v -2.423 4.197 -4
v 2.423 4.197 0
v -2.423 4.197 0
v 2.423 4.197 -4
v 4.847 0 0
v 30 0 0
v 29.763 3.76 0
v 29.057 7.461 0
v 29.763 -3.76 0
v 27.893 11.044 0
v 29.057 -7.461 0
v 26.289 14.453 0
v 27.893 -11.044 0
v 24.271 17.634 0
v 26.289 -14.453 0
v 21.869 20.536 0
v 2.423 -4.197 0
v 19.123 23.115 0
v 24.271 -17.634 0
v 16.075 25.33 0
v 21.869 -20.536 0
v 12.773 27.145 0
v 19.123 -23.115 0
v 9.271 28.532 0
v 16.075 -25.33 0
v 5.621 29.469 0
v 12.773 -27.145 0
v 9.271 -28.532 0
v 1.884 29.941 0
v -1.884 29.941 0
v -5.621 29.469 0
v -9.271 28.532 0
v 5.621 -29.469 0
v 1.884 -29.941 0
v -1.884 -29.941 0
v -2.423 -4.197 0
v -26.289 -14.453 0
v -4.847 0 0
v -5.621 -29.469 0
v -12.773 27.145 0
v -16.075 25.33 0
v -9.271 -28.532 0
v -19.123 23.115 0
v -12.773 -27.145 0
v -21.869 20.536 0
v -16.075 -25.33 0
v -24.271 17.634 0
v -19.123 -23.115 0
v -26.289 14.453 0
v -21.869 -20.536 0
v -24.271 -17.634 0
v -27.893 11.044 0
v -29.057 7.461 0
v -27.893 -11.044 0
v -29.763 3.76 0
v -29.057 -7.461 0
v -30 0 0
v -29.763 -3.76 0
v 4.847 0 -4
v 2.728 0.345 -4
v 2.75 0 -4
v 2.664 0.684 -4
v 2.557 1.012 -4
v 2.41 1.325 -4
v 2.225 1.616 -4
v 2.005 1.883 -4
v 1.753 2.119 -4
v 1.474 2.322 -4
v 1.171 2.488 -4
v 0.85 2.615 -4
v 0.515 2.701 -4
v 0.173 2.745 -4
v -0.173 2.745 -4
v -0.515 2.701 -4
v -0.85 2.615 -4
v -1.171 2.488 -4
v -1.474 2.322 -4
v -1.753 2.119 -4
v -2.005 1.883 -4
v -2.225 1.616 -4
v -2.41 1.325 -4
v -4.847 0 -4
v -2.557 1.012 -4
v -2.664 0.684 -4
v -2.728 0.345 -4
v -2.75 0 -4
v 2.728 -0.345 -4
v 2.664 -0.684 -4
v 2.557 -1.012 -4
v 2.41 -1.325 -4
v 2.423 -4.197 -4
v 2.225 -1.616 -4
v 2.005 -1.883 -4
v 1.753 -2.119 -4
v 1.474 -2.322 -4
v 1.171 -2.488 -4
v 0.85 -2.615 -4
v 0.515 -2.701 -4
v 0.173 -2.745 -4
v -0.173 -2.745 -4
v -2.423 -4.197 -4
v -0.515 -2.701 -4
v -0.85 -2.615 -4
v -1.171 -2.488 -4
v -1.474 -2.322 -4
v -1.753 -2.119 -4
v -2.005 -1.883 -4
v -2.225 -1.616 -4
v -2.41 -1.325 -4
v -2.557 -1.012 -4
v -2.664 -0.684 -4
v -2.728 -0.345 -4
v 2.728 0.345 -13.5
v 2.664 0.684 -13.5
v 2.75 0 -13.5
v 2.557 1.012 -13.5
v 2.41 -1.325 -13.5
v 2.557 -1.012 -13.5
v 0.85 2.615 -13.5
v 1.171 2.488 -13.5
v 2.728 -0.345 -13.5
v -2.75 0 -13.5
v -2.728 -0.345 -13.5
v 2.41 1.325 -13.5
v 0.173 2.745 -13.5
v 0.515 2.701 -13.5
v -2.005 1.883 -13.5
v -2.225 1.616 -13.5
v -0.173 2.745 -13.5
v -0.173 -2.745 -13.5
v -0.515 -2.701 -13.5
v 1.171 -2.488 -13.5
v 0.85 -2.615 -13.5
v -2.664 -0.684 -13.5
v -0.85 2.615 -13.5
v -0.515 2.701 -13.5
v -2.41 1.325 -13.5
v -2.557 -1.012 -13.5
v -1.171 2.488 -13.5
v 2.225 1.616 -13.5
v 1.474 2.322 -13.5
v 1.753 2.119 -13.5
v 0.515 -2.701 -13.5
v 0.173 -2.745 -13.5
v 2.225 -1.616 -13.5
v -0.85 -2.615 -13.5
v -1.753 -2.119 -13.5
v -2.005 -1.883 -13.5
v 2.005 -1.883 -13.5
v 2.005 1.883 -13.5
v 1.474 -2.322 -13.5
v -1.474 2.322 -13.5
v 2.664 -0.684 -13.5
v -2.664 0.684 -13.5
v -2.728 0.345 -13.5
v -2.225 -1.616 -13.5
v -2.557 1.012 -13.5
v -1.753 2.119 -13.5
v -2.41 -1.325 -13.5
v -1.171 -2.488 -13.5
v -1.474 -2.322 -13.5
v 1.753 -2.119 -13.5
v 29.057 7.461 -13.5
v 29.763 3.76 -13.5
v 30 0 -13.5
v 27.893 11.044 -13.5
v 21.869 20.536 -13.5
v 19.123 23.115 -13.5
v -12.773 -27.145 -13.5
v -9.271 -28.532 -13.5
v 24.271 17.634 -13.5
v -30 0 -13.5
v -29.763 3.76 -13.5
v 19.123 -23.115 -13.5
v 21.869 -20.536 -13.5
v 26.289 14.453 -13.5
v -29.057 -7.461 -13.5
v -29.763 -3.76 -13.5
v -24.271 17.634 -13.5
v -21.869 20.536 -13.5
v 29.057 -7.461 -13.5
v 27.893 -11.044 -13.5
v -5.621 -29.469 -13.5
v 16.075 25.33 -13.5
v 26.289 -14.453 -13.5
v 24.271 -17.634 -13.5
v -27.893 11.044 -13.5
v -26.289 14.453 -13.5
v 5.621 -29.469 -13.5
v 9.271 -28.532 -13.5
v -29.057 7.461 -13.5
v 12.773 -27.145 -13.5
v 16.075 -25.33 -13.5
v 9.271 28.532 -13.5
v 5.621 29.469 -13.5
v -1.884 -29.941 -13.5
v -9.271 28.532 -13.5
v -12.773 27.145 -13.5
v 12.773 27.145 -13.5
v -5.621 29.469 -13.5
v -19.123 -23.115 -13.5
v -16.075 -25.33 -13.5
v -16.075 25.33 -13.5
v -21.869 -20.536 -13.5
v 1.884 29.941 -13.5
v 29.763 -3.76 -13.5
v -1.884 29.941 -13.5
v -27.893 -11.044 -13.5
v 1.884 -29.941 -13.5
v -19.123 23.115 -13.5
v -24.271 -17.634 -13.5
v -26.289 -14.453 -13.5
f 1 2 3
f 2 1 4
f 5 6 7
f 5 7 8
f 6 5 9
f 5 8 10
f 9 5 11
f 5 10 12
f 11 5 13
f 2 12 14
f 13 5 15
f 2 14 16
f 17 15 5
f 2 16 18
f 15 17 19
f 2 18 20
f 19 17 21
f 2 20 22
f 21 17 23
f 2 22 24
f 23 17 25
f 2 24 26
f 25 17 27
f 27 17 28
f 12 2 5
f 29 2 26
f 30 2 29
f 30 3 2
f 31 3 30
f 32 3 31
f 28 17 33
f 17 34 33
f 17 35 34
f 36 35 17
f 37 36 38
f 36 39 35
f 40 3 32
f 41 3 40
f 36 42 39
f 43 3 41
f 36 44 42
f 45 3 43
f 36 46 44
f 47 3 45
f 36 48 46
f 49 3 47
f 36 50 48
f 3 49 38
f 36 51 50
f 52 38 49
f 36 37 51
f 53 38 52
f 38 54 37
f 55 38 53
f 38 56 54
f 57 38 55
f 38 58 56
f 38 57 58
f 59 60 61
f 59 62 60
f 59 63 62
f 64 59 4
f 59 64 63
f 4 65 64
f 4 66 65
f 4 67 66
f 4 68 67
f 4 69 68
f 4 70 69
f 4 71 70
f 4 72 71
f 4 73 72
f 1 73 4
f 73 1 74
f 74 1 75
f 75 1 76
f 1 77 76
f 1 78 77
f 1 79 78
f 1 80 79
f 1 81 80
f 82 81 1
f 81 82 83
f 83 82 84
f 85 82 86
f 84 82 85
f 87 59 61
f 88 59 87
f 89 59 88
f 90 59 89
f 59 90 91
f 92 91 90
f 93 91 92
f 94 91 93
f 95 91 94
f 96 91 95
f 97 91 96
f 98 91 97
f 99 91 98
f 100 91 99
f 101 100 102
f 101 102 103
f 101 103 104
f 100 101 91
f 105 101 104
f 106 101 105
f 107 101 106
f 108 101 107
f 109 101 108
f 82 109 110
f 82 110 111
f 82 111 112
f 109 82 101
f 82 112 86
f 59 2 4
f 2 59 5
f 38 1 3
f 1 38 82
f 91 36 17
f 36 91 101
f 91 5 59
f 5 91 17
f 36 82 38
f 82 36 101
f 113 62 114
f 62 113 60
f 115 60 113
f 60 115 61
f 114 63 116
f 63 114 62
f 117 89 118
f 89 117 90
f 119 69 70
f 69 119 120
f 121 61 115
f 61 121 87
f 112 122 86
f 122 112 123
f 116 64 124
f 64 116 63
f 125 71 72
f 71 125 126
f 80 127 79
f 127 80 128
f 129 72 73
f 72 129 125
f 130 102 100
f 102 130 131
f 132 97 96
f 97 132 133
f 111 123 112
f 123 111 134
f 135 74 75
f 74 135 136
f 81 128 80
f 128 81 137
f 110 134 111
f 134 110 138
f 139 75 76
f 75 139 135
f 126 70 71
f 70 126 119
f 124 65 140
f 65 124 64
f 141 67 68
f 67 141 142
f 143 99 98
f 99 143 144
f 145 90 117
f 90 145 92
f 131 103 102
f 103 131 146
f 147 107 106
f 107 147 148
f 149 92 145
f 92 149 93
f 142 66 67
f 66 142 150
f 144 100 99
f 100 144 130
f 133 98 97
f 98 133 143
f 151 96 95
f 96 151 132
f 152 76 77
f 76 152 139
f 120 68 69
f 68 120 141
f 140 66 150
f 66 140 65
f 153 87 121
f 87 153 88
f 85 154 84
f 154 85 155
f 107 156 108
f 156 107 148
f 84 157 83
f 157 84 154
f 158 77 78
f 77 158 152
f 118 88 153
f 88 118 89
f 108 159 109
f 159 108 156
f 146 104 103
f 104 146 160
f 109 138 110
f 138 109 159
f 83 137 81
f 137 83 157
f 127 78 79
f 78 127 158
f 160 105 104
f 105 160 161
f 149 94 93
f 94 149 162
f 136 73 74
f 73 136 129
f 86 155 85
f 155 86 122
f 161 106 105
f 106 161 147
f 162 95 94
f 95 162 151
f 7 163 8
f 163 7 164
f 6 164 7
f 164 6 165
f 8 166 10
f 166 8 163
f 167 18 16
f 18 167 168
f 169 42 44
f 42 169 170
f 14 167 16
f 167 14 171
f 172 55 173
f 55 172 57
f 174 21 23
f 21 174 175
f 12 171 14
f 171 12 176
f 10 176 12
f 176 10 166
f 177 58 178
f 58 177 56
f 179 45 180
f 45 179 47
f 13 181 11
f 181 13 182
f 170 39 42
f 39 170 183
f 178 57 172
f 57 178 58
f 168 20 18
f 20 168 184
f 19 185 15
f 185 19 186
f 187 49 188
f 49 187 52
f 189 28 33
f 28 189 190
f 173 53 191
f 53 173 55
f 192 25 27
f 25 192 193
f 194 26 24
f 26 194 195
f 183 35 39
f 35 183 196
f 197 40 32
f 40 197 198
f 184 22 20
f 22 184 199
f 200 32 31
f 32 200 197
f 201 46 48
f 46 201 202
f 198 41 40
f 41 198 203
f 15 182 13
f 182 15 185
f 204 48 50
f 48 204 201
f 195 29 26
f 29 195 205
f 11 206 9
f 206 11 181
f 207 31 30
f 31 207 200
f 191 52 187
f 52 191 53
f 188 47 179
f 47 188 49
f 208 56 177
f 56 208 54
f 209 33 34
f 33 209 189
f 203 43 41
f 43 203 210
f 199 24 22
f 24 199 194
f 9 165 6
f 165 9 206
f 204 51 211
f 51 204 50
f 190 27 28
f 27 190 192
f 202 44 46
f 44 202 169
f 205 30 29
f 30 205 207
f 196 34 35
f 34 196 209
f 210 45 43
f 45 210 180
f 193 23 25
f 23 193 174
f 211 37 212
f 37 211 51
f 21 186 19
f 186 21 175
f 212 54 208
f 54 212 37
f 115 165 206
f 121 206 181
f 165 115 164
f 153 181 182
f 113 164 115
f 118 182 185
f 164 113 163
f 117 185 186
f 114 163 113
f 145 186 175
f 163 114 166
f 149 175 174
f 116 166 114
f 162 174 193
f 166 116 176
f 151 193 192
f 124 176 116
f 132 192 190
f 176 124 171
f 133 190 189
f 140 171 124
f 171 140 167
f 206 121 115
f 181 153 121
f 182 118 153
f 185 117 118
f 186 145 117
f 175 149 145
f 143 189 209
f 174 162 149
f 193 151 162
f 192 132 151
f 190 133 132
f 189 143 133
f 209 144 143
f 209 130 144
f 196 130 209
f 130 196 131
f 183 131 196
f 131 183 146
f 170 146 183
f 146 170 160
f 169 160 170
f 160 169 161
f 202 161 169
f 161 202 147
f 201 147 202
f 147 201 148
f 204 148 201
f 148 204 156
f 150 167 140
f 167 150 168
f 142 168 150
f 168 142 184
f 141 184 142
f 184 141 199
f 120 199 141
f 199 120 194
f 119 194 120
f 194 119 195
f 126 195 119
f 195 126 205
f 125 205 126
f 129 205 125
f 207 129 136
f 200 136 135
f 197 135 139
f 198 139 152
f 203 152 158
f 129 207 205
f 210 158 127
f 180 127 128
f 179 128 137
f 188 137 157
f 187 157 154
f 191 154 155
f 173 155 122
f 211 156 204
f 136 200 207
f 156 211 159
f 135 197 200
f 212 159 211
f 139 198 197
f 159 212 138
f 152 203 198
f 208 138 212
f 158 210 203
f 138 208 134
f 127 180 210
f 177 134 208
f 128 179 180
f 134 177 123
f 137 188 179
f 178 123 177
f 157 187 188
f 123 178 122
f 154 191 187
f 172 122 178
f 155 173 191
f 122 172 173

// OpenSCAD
$fn = 50;


difference() {
	union() {
		translate(v = [0, 0, -13.5000000000]) {
			cylinder(h = 13.5000000000, r = 30.0000000000);
		}
	}
	union() {
		translate(v = [0, 0, 0]) {
			rotate(a = [0, 0, 0]) {
				difference() {
					union() {
						translate(v = [0, 0, -4]) {
							linear_extrude(height = 4) {
								polygon(points = [[4.8468000000, 0.0000000000], [2.4234000000, 4.1974519271], [-2.4234000000, 4.1974519271], [-4.8468000000, 0.0000000000], [-2.4234000000, -4.1974519271], [2.4234000000, -4.1974519271]]);
							}
						}
					}
					union();
				}
			}
		}
		#translate(v = [0, 0, -100.0000000000]) {
			cylinder(h = 200, r = 2.7500000000);
		}
	}
}
